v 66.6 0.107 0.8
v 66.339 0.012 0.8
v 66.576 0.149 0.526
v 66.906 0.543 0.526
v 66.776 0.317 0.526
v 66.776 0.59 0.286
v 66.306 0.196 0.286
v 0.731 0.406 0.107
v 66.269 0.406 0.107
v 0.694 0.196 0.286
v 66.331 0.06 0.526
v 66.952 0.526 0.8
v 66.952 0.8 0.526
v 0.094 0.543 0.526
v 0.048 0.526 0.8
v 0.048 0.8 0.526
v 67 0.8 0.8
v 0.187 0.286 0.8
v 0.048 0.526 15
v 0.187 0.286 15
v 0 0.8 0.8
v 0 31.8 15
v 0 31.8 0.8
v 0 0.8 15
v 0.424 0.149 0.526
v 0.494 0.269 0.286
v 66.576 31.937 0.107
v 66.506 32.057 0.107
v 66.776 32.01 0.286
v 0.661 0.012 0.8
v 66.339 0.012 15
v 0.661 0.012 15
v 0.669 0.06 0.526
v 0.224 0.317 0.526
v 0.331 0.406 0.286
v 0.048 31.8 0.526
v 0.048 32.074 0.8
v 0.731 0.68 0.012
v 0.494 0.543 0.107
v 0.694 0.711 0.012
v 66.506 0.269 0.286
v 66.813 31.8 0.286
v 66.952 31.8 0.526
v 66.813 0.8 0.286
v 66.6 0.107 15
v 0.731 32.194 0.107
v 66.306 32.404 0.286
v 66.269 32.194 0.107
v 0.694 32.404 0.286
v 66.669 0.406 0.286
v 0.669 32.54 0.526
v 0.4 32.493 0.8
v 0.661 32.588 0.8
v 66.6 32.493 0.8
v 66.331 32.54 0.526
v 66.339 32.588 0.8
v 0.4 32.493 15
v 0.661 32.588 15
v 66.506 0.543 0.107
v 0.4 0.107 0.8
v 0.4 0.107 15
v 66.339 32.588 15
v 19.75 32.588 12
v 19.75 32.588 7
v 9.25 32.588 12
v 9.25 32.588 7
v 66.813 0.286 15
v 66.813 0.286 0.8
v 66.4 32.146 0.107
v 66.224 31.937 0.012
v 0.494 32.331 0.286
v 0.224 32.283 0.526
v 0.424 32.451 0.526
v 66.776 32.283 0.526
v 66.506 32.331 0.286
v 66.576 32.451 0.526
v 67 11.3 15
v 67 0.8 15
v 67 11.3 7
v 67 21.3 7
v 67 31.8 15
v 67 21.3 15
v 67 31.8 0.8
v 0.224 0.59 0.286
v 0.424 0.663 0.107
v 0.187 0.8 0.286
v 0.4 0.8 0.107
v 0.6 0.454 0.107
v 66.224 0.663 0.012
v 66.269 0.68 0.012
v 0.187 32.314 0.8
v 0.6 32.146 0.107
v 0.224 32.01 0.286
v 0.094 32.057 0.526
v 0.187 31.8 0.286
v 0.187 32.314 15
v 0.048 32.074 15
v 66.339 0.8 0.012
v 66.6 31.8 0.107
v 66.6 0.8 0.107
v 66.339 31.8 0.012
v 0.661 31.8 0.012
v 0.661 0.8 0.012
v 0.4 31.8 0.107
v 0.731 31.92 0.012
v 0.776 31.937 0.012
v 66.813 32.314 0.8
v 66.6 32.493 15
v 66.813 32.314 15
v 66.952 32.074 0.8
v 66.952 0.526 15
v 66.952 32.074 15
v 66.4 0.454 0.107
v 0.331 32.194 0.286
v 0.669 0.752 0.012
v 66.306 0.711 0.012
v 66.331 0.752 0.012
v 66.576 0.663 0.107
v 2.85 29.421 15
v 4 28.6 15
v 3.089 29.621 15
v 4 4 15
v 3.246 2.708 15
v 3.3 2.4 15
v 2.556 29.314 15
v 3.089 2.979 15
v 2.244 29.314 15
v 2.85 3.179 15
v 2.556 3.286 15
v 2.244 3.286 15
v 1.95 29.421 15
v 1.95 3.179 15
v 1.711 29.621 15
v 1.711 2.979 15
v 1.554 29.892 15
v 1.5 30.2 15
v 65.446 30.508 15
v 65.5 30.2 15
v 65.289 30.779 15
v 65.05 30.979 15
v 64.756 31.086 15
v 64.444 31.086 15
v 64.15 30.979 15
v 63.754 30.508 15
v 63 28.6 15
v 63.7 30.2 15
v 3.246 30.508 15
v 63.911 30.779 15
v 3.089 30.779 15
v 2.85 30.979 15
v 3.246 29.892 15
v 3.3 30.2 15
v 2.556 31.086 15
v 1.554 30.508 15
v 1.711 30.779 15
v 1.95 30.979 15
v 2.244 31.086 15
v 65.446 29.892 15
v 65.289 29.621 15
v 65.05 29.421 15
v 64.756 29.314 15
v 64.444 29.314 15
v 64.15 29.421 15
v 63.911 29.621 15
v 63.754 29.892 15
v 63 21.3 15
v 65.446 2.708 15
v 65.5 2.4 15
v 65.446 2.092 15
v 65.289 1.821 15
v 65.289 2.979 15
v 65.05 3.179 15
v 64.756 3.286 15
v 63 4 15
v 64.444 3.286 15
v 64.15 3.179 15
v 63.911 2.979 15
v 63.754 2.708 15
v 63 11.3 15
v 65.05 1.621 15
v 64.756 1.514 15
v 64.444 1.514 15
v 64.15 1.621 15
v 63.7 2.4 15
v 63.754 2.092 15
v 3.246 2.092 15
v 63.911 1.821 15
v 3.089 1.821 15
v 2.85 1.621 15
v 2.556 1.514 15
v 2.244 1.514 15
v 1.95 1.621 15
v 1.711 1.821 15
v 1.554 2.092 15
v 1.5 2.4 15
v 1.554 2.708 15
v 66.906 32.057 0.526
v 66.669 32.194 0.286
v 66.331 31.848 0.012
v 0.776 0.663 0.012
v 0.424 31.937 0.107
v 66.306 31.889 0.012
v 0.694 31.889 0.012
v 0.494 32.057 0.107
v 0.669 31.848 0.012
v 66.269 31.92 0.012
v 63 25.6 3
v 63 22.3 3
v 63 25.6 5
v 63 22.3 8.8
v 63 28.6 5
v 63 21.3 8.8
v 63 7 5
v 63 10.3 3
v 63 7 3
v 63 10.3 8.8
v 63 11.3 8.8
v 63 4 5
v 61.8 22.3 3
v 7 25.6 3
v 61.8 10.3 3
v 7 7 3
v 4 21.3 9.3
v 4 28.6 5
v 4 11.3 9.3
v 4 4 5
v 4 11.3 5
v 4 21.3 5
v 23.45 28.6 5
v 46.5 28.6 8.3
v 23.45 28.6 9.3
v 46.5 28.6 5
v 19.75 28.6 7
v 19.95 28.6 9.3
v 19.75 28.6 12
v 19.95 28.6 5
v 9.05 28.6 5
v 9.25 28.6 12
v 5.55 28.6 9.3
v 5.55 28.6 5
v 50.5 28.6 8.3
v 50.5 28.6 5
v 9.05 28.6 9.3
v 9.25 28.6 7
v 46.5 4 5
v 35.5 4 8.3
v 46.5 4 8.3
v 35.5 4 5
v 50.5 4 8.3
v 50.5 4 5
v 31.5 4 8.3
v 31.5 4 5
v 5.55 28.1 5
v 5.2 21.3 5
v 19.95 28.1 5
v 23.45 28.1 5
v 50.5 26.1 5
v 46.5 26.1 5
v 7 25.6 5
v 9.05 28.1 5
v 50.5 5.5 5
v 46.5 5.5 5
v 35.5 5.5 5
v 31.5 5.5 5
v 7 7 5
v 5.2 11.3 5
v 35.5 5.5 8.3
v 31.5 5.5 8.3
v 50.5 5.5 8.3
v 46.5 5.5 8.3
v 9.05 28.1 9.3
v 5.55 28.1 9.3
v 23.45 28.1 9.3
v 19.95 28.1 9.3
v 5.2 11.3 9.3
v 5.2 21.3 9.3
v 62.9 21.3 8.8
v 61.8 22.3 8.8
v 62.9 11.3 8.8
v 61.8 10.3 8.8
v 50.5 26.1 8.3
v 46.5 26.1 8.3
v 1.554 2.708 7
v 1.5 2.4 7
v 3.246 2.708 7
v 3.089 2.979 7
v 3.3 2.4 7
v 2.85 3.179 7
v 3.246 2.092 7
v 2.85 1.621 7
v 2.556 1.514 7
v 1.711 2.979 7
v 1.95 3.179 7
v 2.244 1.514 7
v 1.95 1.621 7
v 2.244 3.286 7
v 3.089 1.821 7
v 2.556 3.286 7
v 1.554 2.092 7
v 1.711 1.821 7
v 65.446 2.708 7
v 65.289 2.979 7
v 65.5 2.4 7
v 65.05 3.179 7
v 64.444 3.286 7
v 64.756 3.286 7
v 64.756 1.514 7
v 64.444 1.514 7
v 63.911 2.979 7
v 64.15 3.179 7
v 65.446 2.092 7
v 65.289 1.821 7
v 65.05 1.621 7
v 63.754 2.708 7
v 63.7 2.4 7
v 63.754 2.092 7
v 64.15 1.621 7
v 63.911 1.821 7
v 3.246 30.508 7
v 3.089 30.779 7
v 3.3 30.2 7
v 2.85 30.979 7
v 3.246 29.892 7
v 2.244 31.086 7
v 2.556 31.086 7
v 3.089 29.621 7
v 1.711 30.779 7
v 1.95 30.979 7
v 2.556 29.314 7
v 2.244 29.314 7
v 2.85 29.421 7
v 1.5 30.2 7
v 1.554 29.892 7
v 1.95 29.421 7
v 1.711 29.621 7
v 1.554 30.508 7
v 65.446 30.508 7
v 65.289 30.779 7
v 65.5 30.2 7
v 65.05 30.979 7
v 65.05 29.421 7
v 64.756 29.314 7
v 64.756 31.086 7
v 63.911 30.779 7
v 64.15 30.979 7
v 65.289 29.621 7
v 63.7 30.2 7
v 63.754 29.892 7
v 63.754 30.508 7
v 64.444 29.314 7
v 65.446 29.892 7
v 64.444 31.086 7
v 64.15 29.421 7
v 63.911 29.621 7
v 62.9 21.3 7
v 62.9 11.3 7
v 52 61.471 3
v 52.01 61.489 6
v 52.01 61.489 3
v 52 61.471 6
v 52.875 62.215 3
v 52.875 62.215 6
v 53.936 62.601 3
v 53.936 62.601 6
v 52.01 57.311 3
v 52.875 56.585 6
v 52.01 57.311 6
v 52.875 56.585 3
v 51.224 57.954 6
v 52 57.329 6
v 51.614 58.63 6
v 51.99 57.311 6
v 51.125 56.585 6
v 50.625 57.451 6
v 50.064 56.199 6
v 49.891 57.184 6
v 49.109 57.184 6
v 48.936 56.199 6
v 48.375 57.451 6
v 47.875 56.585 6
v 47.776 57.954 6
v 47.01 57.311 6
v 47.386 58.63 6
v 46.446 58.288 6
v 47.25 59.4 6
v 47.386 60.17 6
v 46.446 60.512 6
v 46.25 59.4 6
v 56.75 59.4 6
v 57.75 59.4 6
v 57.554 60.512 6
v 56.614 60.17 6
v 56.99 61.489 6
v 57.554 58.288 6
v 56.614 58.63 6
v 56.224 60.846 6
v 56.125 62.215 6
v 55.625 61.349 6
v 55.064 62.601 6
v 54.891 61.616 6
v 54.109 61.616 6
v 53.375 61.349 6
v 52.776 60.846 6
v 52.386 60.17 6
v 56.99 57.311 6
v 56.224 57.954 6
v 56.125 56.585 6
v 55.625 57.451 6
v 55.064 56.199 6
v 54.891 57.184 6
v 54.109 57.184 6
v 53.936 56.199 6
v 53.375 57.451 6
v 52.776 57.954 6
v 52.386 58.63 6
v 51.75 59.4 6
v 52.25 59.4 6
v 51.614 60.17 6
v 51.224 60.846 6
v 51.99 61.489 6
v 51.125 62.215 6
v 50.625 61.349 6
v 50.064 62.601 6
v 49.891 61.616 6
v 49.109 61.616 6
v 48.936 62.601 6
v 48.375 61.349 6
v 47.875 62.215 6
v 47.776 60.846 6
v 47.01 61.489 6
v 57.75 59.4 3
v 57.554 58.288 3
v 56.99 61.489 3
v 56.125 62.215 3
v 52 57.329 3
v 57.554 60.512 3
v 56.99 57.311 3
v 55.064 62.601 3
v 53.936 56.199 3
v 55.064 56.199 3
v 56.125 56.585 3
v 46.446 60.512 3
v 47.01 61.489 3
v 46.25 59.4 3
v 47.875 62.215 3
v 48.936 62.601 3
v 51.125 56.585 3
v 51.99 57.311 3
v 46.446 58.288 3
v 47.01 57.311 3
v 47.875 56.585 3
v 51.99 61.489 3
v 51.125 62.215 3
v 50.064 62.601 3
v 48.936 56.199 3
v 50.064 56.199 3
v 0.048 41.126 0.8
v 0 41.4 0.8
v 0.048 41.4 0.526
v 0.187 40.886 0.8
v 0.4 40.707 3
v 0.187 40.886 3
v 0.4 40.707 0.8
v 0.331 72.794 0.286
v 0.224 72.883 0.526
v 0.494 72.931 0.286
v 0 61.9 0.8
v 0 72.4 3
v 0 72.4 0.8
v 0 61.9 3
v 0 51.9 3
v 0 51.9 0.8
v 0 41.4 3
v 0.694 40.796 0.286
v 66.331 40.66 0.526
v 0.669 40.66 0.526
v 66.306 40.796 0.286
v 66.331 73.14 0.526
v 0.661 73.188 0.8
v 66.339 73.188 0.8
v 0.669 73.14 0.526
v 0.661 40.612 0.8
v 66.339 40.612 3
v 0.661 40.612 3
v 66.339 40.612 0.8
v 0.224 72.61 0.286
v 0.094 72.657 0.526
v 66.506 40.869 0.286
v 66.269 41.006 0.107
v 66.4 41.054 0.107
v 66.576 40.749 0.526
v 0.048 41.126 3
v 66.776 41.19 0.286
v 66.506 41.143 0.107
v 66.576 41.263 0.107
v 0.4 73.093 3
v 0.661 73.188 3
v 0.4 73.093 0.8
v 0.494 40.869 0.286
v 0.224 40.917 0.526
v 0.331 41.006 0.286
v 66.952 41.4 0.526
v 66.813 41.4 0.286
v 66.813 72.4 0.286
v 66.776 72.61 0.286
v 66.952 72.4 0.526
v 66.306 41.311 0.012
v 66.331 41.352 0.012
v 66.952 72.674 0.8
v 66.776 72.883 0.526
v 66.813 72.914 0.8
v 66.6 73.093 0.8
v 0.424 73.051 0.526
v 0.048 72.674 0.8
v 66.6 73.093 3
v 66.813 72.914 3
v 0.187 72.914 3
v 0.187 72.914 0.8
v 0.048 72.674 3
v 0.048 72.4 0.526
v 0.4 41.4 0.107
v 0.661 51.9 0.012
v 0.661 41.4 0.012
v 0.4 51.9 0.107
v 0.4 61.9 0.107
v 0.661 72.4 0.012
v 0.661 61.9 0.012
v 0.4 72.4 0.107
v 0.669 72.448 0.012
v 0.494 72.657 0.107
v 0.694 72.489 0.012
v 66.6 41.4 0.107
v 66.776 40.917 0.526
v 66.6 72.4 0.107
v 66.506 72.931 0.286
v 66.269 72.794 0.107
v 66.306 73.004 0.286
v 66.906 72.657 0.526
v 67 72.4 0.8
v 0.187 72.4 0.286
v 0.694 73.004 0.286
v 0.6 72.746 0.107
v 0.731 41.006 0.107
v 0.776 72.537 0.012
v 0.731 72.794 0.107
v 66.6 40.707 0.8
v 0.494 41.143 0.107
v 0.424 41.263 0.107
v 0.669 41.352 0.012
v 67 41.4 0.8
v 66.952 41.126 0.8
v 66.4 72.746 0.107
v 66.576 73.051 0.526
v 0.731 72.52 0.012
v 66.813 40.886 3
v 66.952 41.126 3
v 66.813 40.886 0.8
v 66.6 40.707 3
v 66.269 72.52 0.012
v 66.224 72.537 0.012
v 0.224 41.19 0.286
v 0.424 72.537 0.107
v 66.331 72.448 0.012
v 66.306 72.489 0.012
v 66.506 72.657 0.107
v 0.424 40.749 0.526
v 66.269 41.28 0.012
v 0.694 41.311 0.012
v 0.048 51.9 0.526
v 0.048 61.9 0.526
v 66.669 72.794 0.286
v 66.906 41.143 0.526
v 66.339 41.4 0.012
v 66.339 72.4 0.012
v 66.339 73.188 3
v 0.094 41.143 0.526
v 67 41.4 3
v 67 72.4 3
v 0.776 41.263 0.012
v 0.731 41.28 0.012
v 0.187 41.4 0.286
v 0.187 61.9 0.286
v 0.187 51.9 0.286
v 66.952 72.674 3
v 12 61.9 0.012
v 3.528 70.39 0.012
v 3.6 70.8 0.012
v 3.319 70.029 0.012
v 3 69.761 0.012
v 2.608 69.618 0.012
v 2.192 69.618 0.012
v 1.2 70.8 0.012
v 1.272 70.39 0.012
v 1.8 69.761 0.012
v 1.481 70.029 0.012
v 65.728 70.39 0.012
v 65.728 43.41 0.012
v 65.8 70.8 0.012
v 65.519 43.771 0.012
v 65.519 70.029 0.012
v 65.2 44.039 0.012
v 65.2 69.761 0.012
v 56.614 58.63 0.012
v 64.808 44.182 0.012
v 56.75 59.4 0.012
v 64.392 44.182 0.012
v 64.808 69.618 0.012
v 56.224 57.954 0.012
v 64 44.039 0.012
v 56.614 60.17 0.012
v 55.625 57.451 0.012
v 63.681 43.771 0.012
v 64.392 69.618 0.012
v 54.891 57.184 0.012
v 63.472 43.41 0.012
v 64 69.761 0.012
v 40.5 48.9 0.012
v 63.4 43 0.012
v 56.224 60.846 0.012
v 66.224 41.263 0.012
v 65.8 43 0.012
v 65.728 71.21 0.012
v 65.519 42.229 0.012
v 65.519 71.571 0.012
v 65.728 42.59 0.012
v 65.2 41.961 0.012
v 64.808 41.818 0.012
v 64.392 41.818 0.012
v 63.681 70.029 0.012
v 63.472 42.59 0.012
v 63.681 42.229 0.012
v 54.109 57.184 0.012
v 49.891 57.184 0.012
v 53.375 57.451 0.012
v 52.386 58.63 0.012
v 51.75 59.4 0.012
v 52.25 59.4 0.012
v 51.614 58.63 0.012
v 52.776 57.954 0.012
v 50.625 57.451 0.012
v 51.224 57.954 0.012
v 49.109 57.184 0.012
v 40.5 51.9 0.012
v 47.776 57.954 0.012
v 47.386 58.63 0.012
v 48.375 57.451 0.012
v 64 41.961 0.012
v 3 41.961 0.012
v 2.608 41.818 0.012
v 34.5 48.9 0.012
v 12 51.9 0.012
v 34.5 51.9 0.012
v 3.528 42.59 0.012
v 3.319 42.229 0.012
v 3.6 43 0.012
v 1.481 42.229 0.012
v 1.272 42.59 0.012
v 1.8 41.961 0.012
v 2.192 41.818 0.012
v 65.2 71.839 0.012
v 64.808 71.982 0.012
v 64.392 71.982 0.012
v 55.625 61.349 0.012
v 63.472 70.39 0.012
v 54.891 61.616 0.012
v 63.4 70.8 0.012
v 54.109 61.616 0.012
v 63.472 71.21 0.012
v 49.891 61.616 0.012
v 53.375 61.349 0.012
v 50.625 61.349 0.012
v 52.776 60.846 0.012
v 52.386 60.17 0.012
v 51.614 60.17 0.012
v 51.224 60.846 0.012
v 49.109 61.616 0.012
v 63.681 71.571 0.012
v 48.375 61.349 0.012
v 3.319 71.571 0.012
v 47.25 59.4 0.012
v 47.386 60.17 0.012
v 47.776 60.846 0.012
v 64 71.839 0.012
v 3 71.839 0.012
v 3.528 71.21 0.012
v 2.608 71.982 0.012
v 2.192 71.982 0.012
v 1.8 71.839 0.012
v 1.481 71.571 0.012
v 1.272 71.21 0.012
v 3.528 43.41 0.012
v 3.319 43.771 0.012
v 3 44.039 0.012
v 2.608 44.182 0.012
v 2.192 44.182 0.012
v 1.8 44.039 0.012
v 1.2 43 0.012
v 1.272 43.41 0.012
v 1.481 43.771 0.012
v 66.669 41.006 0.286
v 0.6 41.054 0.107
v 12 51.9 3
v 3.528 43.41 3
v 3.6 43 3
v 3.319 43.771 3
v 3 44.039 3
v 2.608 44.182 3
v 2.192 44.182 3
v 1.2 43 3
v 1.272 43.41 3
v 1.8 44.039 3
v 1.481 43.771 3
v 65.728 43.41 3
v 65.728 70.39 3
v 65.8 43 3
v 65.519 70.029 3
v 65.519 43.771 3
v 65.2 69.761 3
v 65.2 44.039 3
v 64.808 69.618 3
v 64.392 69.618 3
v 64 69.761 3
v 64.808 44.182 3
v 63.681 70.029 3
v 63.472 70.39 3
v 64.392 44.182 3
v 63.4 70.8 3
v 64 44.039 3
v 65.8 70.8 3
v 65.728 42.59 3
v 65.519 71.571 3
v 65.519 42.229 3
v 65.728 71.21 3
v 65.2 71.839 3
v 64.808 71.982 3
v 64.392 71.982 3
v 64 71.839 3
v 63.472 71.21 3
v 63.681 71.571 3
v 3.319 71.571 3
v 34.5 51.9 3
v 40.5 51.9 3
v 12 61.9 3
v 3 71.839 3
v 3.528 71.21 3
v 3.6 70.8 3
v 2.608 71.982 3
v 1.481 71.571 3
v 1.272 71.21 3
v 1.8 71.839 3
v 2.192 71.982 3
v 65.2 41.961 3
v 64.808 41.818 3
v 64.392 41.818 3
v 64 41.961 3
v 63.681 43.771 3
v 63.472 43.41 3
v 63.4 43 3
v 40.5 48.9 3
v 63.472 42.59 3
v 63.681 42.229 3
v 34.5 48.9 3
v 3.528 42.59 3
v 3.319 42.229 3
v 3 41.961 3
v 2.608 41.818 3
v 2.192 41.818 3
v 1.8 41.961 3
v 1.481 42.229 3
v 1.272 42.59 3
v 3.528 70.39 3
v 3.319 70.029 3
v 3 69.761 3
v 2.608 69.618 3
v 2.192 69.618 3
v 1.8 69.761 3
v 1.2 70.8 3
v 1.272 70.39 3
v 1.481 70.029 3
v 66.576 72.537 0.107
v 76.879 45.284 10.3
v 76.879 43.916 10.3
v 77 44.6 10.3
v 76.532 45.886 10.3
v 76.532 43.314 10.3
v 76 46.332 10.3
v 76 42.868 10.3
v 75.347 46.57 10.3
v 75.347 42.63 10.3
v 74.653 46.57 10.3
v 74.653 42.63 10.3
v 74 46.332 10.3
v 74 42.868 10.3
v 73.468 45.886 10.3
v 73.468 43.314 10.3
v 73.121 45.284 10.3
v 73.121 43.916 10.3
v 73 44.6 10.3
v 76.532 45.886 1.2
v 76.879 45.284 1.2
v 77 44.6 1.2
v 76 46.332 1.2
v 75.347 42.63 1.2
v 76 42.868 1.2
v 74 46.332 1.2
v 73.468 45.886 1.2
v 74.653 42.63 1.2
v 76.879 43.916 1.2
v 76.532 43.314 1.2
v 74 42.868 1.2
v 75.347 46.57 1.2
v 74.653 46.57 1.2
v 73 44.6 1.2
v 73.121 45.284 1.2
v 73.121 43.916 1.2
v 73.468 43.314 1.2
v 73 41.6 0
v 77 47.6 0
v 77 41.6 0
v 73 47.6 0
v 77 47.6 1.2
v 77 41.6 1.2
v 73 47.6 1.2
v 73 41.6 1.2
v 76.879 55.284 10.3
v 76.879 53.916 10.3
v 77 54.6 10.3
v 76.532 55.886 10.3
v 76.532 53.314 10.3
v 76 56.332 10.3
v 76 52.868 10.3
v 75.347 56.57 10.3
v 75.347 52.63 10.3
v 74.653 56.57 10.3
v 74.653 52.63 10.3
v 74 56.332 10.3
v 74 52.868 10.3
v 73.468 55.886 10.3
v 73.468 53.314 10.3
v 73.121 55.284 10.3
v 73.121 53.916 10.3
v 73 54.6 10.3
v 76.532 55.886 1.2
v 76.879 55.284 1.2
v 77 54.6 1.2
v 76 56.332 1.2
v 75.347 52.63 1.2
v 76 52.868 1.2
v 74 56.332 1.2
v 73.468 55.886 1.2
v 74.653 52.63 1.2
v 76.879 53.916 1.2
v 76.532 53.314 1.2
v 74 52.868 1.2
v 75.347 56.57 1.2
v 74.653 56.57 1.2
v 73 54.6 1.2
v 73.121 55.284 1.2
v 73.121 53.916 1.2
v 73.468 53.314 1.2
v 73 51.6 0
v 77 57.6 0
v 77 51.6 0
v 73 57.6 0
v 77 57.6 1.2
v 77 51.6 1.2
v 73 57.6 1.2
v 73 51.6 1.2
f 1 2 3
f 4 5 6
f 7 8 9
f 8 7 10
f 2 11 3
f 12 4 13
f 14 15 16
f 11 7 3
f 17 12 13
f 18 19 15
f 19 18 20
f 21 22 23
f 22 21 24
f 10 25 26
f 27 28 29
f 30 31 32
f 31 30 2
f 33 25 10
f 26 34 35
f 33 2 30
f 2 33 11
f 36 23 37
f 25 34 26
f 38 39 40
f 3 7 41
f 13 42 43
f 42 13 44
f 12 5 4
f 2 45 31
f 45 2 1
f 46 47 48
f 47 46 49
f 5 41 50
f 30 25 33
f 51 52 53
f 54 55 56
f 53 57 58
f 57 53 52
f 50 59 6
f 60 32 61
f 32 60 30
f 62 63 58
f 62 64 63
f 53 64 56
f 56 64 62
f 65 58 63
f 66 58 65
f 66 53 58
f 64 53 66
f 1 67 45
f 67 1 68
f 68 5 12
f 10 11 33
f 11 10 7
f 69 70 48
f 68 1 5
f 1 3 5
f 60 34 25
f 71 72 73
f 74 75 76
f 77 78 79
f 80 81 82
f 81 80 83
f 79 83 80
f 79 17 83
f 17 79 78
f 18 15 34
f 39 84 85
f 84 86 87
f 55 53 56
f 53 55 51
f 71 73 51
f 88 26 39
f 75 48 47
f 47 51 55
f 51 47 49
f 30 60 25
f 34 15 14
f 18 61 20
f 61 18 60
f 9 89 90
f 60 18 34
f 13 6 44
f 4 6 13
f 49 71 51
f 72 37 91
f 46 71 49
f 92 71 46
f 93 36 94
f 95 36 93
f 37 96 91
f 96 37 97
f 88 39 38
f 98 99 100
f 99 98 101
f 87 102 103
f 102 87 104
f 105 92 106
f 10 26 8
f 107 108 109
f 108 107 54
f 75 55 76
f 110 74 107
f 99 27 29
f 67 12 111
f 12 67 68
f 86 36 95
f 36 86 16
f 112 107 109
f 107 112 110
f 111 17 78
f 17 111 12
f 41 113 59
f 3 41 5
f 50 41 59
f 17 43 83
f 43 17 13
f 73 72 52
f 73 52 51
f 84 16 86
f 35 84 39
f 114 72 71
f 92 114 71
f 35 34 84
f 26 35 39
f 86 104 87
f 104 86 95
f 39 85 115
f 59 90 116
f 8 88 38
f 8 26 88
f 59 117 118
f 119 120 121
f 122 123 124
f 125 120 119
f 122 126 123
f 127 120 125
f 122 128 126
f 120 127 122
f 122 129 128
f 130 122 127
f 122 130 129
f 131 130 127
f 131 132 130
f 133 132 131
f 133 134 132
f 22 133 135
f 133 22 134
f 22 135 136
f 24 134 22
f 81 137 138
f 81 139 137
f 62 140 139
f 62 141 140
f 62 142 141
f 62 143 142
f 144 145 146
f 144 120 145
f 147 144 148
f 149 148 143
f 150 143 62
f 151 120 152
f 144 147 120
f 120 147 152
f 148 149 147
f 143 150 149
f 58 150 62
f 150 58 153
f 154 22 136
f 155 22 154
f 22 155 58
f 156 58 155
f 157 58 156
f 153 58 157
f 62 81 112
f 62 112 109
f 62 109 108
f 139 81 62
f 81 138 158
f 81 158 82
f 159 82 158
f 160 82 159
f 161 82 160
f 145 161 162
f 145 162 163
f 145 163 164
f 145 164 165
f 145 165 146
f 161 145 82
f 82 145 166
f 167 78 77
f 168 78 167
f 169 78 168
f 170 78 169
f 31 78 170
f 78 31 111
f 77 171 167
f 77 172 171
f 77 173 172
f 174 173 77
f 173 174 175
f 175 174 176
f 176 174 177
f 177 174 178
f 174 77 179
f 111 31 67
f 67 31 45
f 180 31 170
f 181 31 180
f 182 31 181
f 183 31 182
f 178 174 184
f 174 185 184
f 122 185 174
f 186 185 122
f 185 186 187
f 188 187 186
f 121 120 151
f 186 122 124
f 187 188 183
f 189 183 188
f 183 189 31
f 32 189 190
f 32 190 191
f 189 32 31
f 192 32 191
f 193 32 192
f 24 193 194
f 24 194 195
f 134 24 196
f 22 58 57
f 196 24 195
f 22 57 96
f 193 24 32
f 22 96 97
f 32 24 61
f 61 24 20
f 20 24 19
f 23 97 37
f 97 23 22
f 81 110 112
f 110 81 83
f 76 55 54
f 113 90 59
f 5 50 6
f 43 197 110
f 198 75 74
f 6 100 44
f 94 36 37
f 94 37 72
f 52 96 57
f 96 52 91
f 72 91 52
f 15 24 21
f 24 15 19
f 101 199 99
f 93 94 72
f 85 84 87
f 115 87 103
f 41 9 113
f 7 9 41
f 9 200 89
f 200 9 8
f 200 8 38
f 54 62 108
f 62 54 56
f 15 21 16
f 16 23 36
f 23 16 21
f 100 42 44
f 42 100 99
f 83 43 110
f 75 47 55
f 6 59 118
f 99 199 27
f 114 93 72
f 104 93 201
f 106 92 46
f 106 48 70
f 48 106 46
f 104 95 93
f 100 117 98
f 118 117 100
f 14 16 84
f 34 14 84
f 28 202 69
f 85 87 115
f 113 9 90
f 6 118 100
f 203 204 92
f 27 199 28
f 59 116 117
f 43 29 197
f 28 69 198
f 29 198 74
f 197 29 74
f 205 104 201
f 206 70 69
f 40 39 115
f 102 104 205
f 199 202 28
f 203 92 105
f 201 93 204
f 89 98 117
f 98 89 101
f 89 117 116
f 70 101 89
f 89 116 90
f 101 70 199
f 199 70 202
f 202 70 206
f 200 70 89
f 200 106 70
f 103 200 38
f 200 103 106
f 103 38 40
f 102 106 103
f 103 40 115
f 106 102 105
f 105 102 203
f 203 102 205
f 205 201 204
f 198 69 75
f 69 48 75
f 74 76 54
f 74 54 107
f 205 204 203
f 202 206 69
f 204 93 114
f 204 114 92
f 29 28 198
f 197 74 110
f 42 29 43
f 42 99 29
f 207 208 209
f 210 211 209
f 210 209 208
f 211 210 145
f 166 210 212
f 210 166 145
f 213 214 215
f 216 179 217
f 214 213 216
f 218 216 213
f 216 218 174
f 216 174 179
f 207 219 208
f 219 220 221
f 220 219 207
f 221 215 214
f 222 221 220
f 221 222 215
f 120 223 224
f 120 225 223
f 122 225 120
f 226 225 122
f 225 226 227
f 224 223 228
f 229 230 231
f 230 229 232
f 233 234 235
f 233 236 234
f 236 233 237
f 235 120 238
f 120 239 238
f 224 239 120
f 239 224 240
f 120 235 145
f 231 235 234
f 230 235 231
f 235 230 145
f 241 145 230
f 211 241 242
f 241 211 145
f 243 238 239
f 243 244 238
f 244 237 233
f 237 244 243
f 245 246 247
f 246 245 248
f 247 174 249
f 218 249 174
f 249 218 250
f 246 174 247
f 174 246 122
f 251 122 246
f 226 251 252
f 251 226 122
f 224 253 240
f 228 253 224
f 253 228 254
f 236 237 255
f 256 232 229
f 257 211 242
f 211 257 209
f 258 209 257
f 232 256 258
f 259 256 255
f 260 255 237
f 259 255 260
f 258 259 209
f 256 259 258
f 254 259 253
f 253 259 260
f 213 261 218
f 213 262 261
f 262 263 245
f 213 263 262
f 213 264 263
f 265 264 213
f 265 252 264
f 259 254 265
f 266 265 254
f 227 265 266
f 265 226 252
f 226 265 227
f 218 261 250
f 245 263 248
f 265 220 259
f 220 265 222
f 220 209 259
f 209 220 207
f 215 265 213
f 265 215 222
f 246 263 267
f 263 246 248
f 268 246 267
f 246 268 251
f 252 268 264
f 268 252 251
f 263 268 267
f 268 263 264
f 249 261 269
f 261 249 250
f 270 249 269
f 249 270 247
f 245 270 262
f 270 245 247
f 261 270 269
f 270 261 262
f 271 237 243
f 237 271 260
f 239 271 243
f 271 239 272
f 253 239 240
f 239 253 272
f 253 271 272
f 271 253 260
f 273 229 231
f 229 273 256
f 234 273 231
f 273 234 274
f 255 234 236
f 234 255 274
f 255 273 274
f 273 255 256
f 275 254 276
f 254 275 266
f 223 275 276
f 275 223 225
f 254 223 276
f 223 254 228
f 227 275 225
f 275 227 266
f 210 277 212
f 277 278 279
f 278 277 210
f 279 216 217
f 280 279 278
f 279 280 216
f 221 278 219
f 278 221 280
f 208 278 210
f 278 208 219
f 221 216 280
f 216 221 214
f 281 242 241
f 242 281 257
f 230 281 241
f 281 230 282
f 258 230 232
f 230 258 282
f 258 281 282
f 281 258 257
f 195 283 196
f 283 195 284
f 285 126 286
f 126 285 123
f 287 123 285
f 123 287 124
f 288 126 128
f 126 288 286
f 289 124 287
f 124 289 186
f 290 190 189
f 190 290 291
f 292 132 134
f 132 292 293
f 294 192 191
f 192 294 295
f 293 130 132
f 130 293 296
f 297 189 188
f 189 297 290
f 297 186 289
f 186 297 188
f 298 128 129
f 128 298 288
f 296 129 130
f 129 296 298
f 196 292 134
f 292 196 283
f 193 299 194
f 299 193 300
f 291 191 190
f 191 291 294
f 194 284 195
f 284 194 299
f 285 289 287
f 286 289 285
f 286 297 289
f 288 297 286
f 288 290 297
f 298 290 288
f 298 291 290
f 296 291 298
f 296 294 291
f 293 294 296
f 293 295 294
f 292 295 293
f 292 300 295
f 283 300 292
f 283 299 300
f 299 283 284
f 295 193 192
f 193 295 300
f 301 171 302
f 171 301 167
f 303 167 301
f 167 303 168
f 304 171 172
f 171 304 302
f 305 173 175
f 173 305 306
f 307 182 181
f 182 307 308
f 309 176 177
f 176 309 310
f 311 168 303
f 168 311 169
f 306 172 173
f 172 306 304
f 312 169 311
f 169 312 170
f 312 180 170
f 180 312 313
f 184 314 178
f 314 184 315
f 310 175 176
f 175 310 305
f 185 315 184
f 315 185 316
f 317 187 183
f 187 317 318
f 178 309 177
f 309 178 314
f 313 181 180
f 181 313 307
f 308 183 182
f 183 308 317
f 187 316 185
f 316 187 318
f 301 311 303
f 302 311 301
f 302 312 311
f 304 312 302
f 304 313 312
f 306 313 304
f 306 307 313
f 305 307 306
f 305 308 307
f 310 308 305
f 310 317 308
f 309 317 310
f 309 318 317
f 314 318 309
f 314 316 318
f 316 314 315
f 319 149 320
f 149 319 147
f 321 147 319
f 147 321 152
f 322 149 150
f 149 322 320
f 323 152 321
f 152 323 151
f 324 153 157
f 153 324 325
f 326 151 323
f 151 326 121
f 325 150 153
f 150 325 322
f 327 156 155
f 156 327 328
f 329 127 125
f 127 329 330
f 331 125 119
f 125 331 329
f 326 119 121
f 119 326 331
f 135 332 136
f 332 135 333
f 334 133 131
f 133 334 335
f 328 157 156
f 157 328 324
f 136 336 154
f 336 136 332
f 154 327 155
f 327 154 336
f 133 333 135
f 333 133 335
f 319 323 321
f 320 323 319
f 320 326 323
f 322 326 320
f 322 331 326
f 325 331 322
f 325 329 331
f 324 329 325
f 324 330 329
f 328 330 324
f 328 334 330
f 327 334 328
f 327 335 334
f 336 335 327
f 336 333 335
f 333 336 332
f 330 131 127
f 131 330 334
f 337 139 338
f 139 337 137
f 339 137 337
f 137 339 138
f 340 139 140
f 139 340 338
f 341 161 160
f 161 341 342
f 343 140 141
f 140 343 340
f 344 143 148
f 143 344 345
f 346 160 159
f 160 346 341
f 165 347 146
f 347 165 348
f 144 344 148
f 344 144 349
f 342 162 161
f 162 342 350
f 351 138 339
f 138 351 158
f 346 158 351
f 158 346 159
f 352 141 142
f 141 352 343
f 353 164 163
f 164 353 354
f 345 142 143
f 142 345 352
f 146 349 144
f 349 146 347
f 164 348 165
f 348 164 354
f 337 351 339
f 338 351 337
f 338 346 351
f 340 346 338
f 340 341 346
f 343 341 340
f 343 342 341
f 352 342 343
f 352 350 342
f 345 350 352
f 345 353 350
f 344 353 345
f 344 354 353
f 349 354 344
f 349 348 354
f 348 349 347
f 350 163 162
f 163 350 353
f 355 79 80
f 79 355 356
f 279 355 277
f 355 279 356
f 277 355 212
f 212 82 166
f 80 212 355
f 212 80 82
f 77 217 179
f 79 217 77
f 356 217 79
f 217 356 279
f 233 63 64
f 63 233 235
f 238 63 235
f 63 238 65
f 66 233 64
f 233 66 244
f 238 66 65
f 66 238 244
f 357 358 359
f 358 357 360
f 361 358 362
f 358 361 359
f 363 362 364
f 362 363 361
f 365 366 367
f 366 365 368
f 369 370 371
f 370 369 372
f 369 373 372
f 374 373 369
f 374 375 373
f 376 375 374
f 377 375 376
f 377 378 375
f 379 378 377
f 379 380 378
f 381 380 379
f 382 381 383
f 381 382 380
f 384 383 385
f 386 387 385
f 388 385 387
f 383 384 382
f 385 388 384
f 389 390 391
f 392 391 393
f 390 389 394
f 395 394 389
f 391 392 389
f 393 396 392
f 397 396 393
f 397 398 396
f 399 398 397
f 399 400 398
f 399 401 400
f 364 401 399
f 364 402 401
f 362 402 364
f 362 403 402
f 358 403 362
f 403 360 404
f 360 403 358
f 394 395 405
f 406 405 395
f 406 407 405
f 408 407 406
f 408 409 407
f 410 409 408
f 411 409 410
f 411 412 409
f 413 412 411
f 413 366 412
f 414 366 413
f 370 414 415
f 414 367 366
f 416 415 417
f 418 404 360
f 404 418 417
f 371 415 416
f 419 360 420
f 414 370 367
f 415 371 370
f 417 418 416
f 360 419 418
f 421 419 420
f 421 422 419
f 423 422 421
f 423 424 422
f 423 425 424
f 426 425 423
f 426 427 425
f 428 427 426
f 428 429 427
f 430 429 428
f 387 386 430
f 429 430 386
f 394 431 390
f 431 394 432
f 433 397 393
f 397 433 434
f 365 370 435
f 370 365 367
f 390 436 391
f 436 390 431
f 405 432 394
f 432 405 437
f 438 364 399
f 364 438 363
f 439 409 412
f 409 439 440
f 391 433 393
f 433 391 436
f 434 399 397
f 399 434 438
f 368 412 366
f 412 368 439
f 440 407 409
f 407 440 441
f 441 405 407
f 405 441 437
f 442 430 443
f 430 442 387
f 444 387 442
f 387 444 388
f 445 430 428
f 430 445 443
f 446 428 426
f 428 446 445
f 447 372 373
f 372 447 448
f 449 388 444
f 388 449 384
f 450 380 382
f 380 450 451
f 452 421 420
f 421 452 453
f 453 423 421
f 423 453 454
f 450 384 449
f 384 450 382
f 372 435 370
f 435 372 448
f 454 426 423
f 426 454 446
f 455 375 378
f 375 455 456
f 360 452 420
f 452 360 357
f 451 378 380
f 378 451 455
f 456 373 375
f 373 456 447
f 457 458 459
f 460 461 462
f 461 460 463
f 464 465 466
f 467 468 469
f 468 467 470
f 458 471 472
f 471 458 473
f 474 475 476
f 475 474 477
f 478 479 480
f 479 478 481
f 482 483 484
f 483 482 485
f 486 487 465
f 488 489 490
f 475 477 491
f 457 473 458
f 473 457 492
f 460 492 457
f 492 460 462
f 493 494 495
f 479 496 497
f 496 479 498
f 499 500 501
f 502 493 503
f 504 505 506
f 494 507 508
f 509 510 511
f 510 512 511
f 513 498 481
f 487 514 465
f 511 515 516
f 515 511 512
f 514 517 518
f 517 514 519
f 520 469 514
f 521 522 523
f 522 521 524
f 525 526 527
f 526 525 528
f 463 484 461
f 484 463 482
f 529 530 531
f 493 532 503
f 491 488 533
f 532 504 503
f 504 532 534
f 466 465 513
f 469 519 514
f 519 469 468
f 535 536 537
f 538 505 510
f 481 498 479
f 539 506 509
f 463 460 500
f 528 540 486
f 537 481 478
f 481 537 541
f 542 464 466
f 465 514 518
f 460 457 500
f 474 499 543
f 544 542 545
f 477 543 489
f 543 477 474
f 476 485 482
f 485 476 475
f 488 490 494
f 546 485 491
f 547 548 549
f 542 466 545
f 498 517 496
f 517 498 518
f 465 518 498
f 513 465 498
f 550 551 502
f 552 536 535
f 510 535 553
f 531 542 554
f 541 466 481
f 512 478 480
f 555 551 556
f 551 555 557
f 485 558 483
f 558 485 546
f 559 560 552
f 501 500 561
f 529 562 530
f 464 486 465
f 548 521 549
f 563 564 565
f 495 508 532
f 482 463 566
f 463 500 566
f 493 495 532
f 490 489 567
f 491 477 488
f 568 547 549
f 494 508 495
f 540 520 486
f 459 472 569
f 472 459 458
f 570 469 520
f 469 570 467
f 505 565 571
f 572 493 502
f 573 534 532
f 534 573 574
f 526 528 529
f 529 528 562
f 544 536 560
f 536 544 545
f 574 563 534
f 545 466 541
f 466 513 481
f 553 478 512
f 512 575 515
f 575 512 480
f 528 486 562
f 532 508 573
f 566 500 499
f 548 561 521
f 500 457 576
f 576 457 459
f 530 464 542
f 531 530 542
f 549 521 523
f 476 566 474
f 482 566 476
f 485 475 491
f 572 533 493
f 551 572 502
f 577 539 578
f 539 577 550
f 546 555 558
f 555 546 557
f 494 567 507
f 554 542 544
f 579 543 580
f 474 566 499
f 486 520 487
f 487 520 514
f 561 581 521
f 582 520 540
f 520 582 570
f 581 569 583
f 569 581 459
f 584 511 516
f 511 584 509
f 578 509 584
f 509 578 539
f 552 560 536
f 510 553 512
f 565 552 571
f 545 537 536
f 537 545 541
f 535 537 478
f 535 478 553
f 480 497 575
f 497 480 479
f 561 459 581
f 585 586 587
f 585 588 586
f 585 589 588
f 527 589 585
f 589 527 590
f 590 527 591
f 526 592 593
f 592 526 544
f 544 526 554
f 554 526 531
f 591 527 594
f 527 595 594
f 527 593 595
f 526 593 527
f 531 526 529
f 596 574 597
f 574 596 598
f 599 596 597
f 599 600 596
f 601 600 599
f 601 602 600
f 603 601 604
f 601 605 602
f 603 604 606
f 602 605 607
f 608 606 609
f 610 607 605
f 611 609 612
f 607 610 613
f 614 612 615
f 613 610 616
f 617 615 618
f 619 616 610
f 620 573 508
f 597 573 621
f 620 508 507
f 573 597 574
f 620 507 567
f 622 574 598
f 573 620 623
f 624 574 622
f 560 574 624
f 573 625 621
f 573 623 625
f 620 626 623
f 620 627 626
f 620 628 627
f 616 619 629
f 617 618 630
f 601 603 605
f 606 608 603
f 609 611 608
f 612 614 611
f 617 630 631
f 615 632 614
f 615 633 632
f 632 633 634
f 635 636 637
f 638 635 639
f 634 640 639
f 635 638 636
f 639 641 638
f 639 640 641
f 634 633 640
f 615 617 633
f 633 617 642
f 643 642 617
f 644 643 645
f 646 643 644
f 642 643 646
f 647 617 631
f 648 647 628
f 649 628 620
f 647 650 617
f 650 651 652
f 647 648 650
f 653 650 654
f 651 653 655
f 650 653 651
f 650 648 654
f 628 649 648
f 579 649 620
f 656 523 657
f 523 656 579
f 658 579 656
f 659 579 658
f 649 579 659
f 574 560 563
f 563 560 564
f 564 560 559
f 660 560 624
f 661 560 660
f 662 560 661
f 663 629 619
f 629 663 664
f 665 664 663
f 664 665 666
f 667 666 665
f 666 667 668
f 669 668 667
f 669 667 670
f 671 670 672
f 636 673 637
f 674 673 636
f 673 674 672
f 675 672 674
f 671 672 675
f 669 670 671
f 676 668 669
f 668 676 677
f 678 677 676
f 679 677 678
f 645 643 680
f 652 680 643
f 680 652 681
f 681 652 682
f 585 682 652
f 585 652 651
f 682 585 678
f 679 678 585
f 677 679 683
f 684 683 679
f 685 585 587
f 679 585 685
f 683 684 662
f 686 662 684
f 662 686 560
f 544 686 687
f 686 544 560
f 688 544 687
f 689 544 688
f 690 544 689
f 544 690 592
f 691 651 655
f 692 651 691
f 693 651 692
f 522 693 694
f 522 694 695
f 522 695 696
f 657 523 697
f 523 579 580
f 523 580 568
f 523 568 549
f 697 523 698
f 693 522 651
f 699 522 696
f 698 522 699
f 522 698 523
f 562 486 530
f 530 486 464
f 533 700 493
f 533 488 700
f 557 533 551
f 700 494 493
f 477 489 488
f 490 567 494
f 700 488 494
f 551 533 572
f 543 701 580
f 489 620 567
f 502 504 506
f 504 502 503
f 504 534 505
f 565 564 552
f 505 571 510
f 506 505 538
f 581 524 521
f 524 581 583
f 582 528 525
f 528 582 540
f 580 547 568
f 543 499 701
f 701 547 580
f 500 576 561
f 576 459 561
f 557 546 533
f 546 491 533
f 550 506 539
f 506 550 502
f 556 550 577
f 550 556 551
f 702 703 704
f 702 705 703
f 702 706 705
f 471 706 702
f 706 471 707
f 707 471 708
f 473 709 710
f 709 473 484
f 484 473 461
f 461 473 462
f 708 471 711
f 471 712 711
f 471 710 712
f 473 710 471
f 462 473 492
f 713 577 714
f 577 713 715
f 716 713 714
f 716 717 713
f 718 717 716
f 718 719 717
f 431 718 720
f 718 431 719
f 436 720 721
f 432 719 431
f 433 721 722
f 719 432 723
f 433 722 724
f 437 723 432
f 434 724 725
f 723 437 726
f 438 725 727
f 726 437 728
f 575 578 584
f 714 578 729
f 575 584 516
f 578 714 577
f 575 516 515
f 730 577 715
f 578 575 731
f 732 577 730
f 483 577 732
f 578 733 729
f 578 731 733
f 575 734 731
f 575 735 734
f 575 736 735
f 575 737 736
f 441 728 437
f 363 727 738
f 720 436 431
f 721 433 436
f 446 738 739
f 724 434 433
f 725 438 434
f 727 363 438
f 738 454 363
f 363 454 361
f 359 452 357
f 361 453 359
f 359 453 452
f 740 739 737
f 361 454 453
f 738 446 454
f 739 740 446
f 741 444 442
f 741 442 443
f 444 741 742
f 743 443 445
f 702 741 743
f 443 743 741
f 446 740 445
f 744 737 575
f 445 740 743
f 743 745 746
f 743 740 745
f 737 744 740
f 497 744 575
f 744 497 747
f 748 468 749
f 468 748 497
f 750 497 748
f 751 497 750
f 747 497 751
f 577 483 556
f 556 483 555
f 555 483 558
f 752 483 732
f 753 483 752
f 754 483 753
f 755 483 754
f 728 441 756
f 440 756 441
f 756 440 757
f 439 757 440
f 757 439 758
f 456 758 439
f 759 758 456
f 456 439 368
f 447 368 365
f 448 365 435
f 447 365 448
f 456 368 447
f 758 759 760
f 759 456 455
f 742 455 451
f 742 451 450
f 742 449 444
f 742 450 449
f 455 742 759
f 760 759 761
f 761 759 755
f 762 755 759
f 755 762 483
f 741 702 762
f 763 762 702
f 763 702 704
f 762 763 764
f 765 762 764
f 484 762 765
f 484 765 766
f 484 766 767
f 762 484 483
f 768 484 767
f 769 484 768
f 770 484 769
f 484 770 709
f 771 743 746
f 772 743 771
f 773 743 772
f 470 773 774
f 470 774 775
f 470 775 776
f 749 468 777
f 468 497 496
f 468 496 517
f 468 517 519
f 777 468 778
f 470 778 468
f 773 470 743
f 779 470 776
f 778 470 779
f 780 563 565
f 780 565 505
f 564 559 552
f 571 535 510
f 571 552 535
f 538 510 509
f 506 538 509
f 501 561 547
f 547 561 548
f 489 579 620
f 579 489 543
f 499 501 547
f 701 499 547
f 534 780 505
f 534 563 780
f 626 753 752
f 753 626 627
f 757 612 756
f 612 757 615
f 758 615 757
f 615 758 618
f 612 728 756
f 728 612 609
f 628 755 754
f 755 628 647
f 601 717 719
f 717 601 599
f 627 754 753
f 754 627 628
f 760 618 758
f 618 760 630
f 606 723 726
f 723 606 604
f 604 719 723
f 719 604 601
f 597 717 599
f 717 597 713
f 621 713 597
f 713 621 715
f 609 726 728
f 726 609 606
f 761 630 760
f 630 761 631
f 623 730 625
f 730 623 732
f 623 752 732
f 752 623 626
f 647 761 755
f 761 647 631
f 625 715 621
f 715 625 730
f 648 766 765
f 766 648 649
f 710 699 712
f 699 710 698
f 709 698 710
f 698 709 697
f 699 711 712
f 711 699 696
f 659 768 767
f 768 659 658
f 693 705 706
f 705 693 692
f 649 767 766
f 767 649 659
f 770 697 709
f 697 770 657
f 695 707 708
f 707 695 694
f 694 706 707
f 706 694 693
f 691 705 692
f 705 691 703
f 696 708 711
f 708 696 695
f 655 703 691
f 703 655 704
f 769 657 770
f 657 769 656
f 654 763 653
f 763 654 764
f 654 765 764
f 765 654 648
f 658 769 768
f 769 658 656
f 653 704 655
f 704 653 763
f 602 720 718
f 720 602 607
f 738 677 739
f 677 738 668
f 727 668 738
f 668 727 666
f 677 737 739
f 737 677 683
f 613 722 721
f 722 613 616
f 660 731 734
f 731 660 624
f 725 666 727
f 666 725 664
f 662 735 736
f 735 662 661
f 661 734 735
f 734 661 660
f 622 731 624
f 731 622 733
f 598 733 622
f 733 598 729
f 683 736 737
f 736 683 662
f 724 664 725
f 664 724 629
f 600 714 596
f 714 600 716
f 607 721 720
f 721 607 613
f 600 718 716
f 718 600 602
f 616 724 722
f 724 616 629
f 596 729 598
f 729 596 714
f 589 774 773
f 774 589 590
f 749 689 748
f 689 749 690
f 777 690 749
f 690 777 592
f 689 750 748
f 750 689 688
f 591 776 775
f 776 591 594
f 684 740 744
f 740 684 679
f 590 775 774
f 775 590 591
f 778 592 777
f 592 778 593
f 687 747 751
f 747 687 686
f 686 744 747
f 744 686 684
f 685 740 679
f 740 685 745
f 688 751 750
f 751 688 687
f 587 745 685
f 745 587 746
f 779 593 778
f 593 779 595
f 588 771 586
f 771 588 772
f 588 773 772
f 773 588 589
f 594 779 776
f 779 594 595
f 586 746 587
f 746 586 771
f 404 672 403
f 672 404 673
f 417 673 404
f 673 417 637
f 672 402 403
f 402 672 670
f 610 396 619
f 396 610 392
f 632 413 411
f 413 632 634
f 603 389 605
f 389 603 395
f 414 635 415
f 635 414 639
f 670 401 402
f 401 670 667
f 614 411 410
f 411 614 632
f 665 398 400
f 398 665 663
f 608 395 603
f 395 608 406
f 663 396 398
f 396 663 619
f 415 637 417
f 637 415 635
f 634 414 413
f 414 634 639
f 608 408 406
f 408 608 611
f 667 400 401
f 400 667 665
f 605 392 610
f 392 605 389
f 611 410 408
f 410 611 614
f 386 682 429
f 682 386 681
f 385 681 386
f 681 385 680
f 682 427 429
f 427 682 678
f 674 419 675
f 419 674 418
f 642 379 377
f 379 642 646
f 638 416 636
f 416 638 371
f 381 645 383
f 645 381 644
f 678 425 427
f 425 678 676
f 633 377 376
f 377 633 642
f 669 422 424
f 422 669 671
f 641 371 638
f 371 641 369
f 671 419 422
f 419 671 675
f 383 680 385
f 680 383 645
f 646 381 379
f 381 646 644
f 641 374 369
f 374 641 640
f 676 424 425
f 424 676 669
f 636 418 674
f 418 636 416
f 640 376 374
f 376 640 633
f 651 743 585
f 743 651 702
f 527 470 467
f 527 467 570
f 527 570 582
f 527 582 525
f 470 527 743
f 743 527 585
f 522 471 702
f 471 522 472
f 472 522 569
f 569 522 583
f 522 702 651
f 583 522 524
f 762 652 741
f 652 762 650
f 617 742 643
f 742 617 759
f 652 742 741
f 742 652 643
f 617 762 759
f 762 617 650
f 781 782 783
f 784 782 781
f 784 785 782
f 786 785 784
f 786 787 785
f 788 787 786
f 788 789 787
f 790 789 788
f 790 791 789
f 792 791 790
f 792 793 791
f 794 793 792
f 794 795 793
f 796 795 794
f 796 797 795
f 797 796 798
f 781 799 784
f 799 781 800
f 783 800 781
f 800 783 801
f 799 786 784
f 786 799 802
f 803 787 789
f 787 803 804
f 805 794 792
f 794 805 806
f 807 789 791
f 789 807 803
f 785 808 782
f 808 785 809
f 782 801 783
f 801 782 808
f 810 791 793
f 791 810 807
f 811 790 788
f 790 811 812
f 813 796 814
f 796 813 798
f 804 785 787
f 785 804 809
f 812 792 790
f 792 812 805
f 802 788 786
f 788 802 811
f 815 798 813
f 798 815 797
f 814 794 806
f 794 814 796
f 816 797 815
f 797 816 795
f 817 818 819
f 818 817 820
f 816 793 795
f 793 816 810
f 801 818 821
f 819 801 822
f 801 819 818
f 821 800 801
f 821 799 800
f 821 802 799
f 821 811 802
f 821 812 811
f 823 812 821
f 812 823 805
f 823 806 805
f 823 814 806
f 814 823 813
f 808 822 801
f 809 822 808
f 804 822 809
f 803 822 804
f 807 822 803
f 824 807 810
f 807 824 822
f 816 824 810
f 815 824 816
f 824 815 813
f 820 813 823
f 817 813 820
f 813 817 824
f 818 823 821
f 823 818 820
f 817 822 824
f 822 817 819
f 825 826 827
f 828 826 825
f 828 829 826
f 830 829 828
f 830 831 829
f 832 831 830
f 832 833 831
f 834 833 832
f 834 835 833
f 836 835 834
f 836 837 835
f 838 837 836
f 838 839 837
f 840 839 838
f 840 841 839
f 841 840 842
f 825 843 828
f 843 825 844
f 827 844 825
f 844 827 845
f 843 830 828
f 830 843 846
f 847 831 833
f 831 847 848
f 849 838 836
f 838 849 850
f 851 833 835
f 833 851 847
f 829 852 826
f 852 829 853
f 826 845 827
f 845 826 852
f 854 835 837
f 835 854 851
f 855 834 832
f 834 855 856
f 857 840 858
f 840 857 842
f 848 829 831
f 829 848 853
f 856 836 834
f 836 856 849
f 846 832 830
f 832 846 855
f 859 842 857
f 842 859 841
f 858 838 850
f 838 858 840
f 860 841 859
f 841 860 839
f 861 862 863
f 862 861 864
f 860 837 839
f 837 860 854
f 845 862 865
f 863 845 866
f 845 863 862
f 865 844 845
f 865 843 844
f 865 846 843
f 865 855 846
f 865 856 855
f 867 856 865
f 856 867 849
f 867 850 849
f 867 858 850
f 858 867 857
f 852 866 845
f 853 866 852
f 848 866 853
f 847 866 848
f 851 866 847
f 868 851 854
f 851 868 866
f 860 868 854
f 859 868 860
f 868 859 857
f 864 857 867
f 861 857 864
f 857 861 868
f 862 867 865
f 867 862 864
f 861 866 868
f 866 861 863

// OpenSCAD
// ---------------------------------------------------------------------------
// MiniVoltMon 3D-printed case  (two halves, M2 corner screws)
//
// Orientation (looking down into the bottom half):
//   +X (right)  = red/black screw-terminal end.  Opening spans the right
//                 wall AND the lid so wires go in from the side and the
//                 terminal screws are reachable from the top.
//   +Y (back)   = "far side": USB-C opening in the back wall.
//   Lid has a cutout for the slide switch and two holes for the push
//   buttons next to the USB-C connector.
//
// Side walls are 4 mm (M2 screws drive into the corners); floor and lid 3 mm.
//
// !! Dimensions in the "MEASURE AND ADJUST" block were estimated from
// !! "Board Image.jpg" (scaled off the ESP32-C3 SuperMini, 22.5 x 17.8 mm).
// !! Verify them with calipers before printing.
// ---------------------------------------------------------------------------

PART = "both";   // "bottom" | "lid" | "both" (print layout) | "assembled"

$fn = 18;
eps = 0.1;       // overlap fudge for clean difference() cuts

// ----------------------- MEASURE AND ADJUST -------------------------------
board_len = 56;     // total assembly length, left edge of ESP32 -> right edge of perfboard
board_w   = 23;     // widest point (ESP32-C3 SuperMini, ~22.5 mm)
board_t   = 1.6;    // PCB thickness
cavity_h  = 12;     // floor top -> lid underside; must clear the screw terminal
                    // (terminal is ~9-10 mm above the perfboard)

// Screw terminal (right end), opening in right wall + lid
term_w        = 10;   // Y width of the opening
term_open_z   = 4;    // wall notch starts this far above the floor (~proto board top)
term_lid_depth = 8;  // how far the lid cutout reaches in from the right inner wall

// USB-C (back wall).  X position measured from the LEFT edge of the board.
usb_cx = 9;           // center of USB-C connector
usb_w  = 10.5;        // opening width
usb_z  = 4.5;           // bottom of the USB-C connector above the inside floor
usb_h  = 4.5;         // opening height (connector is ~3.3 mm + clearance)

// Slide switch (lid cutout).  Position from board origin (left-front corner).
sw_cx = 24;           // center X
sw_cy = 5;            // center Y (switch is near the FRONT edge of the perfboard)
sw_l  = 6;           // cutout size along X
sw_w  = 3;            // cutout size along Y

// Push buttons (lid holes).  Positions from board origin.
btn_d  = 4.5;         // hole diameter
btn1_x = 7;           // first button center X
btn2_x = 12;          // second button center X
btn_y  = 14;          // both buttons' center Y (~9 mm in from the back edge)
btn_top_z = 7.5;      // floor -> top of the push buttons (ESP32 PCB top + ~2.5)

// Board hold: locating ribs (floor) + hold-down ribs (lid underside)
esp_t = 1.0;          // ESP32 SuperMini PCB thickness (perfboard uses board_t)
esp_len = 17.8;       // ESP32 extent along X from the board's left edge
perf_inset_front = 1.0; // perfboard front edge sits this far inside the board envelope
rib_clear = 0.3;      // gap between rib face and PCB edge
rib_w = 4;            // rib width along X (front/perfboard ribs)
back_rib_w = 3.5;     // rib width along X (back/ESP32 ribs)
front_rib_xs = [28, 43];   // board-X spots on the perfboard FRONT edge
                           // (keep clear of the slide switch and terminal)
back_rib_xs  = [1.8, 16.2]; // board-X spots on the ESP32 BACK edge,
                            // either side of the USB connector
// ---------------------------------------------------------------------------

// ------------------------------- case body --------------------------------
wall  = 4;            // side wall thickness
floor_t = 3;          // bottom thickness
lid_t = 3;            // lid thickness
round_r = 0.8;        // rounding radius on the outside corners

gap_side = 0.8;       // clearance board edge -> side walls
gap_end  = 1.5;       // clearance board end -> end walls

// Inner shelf: a ledge rising off the floor along the inside of the walls,
// running the left, front and back walls but NOT the right (terminal) wall.
shelf_h = 2;          // height above the floor
shelf_w = 3;          // how far it protrudes inward from the wall

// M2 screws — driven straight into the wall corners (no posts in the cavity)
pilot_d  = 1.8;       // self-tap pilot hole down the corner walls
pilot_depth = 8;
screw_clr_d = 2.4;    // clearance hole in lid
cb_d     = 4.2;       // M2 pan-head diameter (used for edge clearance)

// Button plungers (free-floating pins that ride in the lid holes)
plunger_d     = btn_d - 0.5;  // sliding fit in the lid hole
plunger_proud = 0.8;          // how far the head sticks out above the lid at rest
flange_t = 1.2;               // retaining flange at the bottom of the stem
flange_x = plunger_d;         // no overhang along X (plungers sit 5 mm apart)
flange_y = 6.0;               // overhangs the hole along Y so it can't fall out

// Plunger guide sleeves: tubes hanging off the lid underside around each
// button hole, to keep the plungers riding straight.
sleeve_h    = 3;              // how far the sleeve reaches down into the cavity
sleeve_wall = 1.0;            // sleeve wall thickness

// ------------------------------- derived ----------------------------------
inner_l = board_len + 2*gap_end;
inner_w = board_w   + 2*gap_side;
outer_l = inner_l + 2*wall;
outer_w = inner_w + 2*wall;
bot_h   = floor_t + cavity_h;

bx0 = wall + gap_end;    // board origin (left-front corner of board) in case coords
by0 = wall + gap_side;

screw_inset = cb_d/2 + 0.3;         // screws nudged inward so the counterbore
                                    // stays 0.3 clear of the lid's outer edges
screw_pos = [
    [screw_inset,           screw_inset],
    [outer_l - screw_inset, screw_inset],
    [screw_inset,           outer_w - screw_inset],
    [outer_l - screw_inset, outer_w - screw_inset]
];

term_cy = by0 + board_w/2;          // terminal opening centered on the board
back_wall_y = wall + inner_w;       // inner face of the back wall


plunger_len = (cavity_h - btn_top_z) + lid_t + plunger_proud;

// Board stack (no standoffs): the proto board rests on its underside solder
// bumps, the ESP32 sits directly on the proto board, and the USB-C shell
// sits on the ESP32 PCB.  usb_z (= ESP32 PCB top) fixes the whole stack.
esp_top  = usb_z;                   // ESP32 PCB top above the inside floor
esp_bot  = usb_z - esp_t;           // ESP32 PCB bottom
perf_top = esp_bot;                 // proto board top
perf_bot = perf_top - board_t;      // proto board bottom (solder bumps below)

echo(str("Outer size: ", outer_l, " x ", outer_w, " x ", bot_h + lid_t, " mm"));

// ------------------------------- modules ----------------------------------
// Outer shell with rounded vertical edges and one rounded face (bottom of
// the base, top of the lid).  The mating face stays square so the two
// halves still sit flush against each other.
module rshell(l, w, h, r, round_top) {
    hull()
        for (x = [r, l - r], y = [r, w - r]) {
            translate([x, y, round_top ? h - r : r]) sphere(r = r);
            translate([x, y, round_top ? 0 : h - 0.5]) cylinder(r = r, h = 0.5);
        }
}

module bottom() {
    difference() {
        union() {
            // shell
            difference() {
                rshell(outer_l, outer_w, bot_h, round_r, false);
                translate([wall, wall, floor_t])
                    cube([inner_l, inner_w, cavity_h + eps]);
            }

            // inner shelf: ledge around the floor on the left/front/back walls,
            // open on the right (terminal) wall.  Built as the floor footprint
            // minus an inner cutout that runs out through the right wall.

            difference() {
                translate([wall, wall, floor_t])
                    cube([inner_l, inner_w, shelf_h]);
                translate([wall + shelf_w, wall + shelf_w, floor_t - eps])
                    cube([inner_l - shelf_w + eps, inner_w - 2*shelf_w, shelf_h + 2*eps]);
            }

            // --- floor locating ribs (stop the board sliding around) ---
            // left end: ESP32 left edge (rib face only meets the PCB edge,
            // 0.3 mm shy of the board, so nothing below the board hits it)
            translate([wall, by0 + board_w/2 - 5, floor_t])
                cube([gap_end - rib_clear, 10, esp_top - 0.2 + shelf_h]);
            // right end: perfboard right edge (stays below the terminal notch)
            translate([wall + inner_l - (gap_end - rib_clear), term_cy - 6, floor_t])
                cube([gap_end - rib_clear, 12, term_open_z - 0.2 + shelf_h]);
            // front wall: perfboard front edge
            for (x = front_rib_xs)
                translate([bx0 + x - rib_w/2, wall, floor_t])
                    cube([rib_w, gap_side + perf_inset_front - rib_clear, perf_top - 0.2 + shelf_h]);
            // back wall: ESP32 back edge, either side of the USB connector
            for (x = back_rib_xs)
                translate([bx0 + x - back_rib_w/2, back_wall_y - (gap_side - rib_clear), floor_t])
                    cube([back_rib_w, gap_side - rib_clear, esp_top - 0.2 + shelf_h]);
            // back wall: perfboard back edge, across from the right-hand front rib
            // (protrudes 2 mm further into the cavity than the other back ribs)
            translate([bx0 + front_rib_xs[1] - rib_w/2, back_wall_y - (gap_side - rib_clear) - 2, floor_t])
                cube([rib_w, gap_side - rib_clear + 2, perf_top - 0.2 + shelf_h]);

        }

        // screw-terminal opening in the right wall (open through the top edge)
        translate([outer_l - wall - eps, term_cy - term_w/2, floor_t + term_open_z])
            cube([wall + 2*eps, term_w, bot_h]);

        // USB-C opening in the back (far) wall (connector bottom at usb_z;
        // the cut starts 0.5 below it for clearance)
        translate([bx0 + usb_cx - usb_w/2, outer_w - wall - eps, floor_t + usb_z - 0.5])
            cube([usb_w, wall + 2*eps, usb_h + 0.5]);

        // pilot holes straight down the wall corners
        for (p = screw_pos)
            translate([p[0], p[1], bot_h - pilot_depth])
                cylinder(d = pilot_d, h = pilot_depth + eps);
    }
}

module lid() {
    difference() {
        union() {
            rshell(outer_l, outer_w, lid_t, round_r, true);

            // plunger guide sleeves: hang down from the lid underside (local
            // -z) around each button hole to keep the plungers riding straight
            for (bx = [btn1_x, btn2_x])
                translate([bx0 + bx, by0 + btn_y, -sleeve_h])
                    cylinder(d = btn_d + 2*sleeve_wall, h = sleeve_h + eps);
        }

        // M2 clearance holes (pan heads sit proud on the lid surface)
        for (p = screw_pos)
            translate([p[0], p[1], -eps])
                cylinder(d = screw_clr_d, h = lid_t + 2*eps);

        // screw-terminal access: cutout meets the right-wall notch so the
        // combined opening is L-shaped (insert wires from the right,
        // tighten screws from the top)
        translate([outer_l - wall - term_lid_depth, term_cy - term_w/2, -eps])
            cube([wall + term_lid_depth + eps, term_w, lid_t + 2*eps]);

        // slide switch window
        translate([bx0 + sw_cx - sw_l/2, by0 + sw_cy - sw_w/2, -eps])
            cube([sw_l, sw_w, lid_t + 2*eps]);

        // push-button holes (bored through the lid and the guide sleeves)
        for (bx = [btn1_x, btn2_x])
            translate([bx0 + bx, by0 + btn_y, -sleeve_h - eps])
                cylinder(d = btn_d, h = lid_t + sleeve_h + 2*eps);
    }
}

// Free-floating button plunger: drop into the lid hole from the inside
// before screwing the lid down.  The bottom flange keeps it captive;
// gravity rests it on the push button.
module plunger() {
    // flat-topped stem, 2 mm taller than the nominal length
    cylinder(d = plunger_d, h = plunger_len + 2);
    translate([-flange_x/2, -flange_y/2, 0])
        cube([flange_x, flange_y, flange_t]);
}

// ------------------------------- output -----------------------------------
if (PART == "bottom") {
    bottom();
} else if (PART == "lid") {
    // printed top-face-down: flat outside surface on the bed
    translate([outer_l, 0, lid_t]) rotate([0, 180, 0]) lid();
} else if (PART == "plungers") {
    // printed flange-down: flat flange on the bed, domed tip up
    for (i = [0, 1])
        translate([0, i * (flange_y + 4), 0])
            plunger();
} else if (PART == "assembled") {
    bottom();
    color("steelblue", 0.5) translate([0, 0, bot_h]) lid();
    color("tomato")
        for (bx = [btn1_x, btn2_x])
            translate([bx0 + bx, by0 + btn_y, floor_t + btn_top_z])
                plunger();
} else { // "both" — print layout, parts side by side
    bottom();
    translate([0, outer_w + 8, 0])
        translate([outer_l, 0, lid_t]) rotate([0, 180, 0]) lid();
    for (i = [0, 1])
        translate([outer_l + 8, outer_w + 12 + i * (flange_y + 4), 0])
            plunger();
}
